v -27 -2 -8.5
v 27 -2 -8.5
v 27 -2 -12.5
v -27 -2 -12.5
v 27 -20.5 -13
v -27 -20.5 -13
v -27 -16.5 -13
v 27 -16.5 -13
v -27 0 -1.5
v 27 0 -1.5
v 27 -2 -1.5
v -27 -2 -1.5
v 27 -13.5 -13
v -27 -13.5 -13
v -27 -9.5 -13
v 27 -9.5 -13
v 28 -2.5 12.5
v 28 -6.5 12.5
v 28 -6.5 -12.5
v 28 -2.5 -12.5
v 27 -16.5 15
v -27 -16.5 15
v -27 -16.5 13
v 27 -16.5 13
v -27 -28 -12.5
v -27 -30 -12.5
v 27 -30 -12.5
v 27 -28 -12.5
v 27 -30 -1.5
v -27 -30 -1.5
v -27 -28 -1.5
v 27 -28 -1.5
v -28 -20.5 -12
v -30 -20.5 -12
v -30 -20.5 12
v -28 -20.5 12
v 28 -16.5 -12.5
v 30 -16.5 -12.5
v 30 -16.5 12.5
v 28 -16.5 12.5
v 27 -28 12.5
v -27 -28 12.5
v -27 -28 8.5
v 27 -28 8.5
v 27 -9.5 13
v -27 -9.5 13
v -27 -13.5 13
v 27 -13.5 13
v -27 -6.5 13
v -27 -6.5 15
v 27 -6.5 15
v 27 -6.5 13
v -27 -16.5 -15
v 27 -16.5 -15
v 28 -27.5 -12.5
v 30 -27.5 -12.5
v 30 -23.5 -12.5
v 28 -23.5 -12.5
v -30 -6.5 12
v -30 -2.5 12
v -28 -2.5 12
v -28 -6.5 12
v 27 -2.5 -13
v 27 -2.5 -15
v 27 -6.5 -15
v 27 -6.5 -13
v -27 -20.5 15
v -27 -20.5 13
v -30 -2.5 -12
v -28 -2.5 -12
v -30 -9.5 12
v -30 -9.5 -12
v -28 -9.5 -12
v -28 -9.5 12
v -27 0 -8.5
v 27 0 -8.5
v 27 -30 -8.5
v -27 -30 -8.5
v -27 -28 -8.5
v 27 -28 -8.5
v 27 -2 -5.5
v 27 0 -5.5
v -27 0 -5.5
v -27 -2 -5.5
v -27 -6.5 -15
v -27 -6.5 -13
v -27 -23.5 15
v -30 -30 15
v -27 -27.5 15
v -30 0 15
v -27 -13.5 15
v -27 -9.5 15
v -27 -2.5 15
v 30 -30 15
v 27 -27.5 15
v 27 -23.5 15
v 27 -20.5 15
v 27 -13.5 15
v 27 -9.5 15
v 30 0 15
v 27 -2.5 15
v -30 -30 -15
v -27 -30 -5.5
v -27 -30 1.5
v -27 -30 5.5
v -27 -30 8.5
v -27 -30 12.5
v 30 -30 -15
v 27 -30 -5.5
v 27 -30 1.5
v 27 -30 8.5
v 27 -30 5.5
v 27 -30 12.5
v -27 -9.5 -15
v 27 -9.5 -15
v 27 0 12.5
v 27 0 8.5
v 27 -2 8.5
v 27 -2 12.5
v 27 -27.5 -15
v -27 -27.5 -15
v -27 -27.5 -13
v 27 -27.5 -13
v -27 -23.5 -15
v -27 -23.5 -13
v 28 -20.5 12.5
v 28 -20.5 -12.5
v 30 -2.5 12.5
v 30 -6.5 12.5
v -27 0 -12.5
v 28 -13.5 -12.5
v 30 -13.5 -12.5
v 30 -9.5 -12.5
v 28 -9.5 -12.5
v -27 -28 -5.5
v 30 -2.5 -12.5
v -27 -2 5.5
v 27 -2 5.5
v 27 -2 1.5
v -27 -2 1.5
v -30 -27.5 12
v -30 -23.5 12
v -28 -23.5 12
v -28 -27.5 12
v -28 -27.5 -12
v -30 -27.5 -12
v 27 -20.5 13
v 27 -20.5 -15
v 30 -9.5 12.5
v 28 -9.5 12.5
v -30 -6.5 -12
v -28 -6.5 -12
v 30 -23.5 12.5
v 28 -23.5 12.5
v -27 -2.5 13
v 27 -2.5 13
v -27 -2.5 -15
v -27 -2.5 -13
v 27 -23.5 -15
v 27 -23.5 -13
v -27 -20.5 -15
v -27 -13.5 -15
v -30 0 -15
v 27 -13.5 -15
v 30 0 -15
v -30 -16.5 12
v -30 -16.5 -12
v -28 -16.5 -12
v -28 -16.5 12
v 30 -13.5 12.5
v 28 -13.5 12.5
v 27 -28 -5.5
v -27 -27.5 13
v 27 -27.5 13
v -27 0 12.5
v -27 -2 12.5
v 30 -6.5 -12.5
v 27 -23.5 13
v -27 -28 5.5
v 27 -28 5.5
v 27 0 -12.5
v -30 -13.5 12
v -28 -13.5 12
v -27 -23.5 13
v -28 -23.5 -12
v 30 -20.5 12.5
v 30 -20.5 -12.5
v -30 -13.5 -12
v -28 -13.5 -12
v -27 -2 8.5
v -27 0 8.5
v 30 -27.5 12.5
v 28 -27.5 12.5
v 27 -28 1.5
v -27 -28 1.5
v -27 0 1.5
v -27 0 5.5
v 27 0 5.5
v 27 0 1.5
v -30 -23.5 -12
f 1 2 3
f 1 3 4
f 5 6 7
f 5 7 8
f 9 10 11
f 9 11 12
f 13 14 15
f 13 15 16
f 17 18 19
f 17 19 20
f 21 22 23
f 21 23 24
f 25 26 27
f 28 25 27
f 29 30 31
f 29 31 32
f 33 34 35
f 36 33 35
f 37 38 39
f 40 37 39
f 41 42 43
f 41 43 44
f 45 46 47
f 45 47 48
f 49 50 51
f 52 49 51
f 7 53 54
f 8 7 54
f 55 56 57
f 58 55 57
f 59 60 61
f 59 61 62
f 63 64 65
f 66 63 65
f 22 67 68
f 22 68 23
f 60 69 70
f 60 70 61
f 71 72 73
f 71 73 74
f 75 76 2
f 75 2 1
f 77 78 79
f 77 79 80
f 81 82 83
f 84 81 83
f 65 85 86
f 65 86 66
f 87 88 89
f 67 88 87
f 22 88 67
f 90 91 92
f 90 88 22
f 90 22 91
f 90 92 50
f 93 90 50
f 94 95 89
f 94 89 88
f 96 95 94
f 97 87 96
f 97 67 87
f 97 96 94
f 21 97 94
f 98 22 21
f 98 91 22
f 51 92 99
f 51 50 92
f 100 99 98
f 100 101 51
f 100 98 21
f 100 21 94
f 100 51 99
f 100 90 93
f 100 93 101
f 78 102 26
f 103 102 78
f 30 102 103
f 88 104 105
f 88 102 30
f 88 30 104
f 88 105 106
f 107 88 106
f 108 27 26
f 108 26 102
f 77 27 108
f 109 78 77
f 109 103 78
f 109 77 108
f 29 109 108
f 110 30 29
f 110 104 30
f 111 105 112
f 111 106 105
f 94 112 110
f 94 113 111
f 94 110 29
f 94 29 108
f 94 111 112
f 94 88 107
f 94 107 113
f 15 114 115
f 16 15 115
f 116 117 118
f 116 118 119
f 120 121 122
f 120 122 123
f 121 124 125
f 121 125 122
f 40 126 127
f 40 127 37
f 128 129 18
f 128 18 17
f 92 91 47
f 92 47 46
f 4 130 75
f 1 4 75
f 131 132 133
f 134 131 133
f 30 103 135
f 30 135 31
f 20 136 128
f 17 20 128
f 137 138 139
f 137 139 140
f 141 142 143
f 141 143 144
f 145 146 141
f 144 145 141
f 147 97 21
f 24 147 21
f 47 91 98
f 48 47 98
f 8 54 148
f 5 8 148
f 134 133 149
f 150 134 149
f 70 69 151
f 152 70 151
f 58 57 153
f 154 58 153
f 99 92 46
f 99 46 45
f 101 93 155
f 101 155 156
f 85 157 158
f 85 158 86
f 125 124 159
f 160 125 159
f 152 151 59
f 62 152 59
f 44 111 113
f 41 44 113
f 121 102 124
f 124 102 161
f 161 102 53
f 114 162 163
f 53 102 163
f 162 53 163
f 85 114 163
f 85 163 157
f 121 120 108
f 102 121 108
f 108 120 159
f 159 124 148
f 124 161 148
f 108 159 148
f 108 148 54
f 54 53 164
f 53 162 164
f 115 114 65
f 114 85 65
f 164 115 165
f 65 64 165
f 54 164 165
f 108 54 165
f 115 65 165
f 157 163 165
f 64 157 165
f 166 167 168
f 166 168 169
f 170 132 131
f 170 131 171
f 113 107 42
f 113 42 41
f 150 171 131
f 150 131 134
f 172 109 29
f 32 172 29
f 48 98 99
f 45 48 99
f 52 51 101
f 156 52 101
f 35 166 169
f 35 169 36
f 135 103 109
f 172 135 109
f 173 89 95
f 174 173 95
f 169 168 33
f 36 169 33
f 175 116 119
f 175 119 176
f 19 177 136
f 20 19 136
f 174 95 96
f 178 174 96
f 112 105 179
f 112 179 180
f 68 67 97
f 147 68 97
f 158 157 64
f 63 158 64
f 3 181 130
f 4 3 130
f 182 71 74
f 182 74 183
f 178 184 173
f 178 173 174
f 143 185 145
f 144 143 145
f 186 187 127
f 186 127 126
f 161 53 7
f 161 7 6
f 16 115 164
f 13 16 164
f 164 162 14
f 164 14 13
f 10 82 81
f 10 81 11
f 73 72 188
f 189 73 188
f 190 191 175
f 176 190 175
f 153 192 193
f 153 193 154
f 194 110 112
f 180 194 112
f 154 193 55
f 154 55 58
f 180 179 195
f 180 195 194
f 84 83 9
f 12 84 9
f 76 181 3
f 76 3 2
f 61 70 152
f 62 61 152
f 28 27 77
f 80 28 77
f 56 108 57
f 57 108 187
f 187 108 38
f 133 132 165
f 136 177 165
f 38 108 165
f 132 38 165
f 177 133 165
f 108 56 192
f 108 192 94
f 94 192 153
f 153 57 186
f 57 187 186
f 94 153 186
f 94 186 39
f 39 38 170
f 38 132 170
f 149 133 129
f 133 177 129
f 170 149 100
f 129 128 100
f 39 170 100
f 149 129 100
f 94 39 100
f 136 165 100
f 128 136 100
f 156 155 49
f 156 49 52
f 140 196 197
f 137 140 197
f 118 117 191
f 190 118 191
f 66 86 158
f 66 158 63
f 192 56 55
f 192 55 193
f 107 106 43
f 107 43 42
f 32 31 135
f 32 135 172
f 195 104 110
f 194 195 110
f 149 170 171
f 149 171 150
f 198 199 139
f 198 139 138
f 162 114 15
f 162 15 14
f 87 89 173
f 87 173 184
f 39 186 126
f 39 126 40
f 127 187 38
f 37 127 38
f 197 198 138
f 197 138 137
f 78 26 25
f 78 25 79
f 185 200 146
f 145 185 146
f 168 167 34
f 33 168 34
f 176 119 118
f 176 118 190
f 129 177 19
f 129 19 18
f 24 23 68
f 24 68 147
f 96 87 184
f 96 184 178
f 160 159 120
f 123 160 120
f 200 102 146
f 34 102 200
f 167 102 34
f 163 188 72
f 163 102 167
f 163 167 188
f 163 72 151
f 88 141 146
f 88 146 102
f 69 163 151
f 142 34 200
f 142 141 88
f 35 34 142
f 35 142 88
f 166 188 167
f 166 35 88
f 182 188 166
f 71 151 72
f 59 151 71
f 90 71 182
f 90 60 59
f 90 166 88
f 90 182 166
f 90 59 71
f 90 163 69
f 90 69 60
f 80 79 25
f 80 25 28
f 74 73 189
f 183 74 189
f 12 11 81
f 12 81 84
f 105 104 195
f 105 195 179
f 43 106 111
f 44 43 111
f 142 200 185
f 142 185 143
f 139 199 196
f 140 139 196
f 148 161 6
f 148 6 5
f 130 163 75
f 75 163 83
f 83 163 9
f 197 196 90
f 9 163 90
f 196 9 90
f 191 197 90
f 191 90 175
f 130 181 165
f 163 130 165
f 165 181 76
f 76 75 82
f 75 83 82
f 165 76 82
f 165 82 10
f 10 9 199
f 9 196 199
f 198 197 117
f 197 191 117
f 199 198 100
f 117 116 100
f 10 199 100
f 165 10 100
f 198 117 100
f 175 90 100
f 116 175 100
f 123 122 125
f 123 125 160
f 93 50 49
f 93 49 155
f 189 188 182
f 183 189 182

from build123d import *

# Parameters (mm, degrees)
F0_W      = 60
F0_H      = 30
F1_DEPTH  = 30
F2_W      = 54
F2_H      = 4
F3_DEPTH  = 2
F4_W      = 54
F4_H      = 4
F5_DEPTH  = 2
F6_W      = 54
F6_H      = 4
F7_DEPTH  = 2
F8_W      = 54
F8_H      = 4
F9_DEPTH  = 2
F10_W     = 4
F10_H     = 24
F11_DEPTH = 2
F12_W     = 4
F12_H     = 25
F13_DEPTH = 2


with BuildPart() as f1:
    # F0 (on Front) → F1 (new body)
    with BuildSketch(Plane.XZ):
        Rectangle(F0_W, F0_H)
    extrude(amount=F1_DEPTH)

    # F2 (on face) → F3 (cut)
    with BuildSketch(Plane.XZ.offset(30)):
        with Locations((0, -10.5)):
            Rectangle(F2_W, F2_H)
        with Locations((0, -3.5)):
            Rectangle(F2_W, F2_H)
        with Locations((0, 3.5)):
            Rectangle(F2_W, F2_H)
        with Locations((0, 10.5)):
            Rectangle(F2_W, F2_H)
    extrude(amount=-F3_DEPTH, mode=Mode.SUBTRACT)

    # F4 (on face) → F5 (cut)
    with BuildSketch(Plane.XY.offset(15)):
        with Locations((0, -4.5)):
            Rectangle(F4_W, F4_H)
        with Locations((0, -11.5)):
            Rectangle(F4_W, F4_H)
        with Locations((0, -18.5)):
            Rectangle(F4_W, F4_H)
        with Locations((0, -25.5)):
            Rectangle(F4_W, F4_H)
    extrude(amount=-F5_DEPTH, mode=Mode.SUBTRACT)

    # F6 (on face) → F7 (cut)
    with BuildSketch(Plane(origin=(0, 0, 0), x_dir=(-1, 0, 0), z_dir=(0, 1, 0))):
        with Locations((0, 10.5)):
            Rectangle(F6_W, F6_H)
        with Locations((0, 3.5)):
            Rectangle(F6_W, F6_H)
        with Locations((0, -3.5)):
            Rectangle(F6_W, F6_H)
        with Locations((0, -10.5)):
            Rectangle(F6_W, F6_H)
    extrude(amount=-F7_DEPTH, mode=Mode.SUBTRACT)

    # F8 (on face) → F9 (cut)
    with BuildSketch(Plane(origin=(0, 0, -15), x_dir=(1, 0, 0), z_dir=(0, 0, -1))):
        with Locations((0, 25.5)):
            Rectangle(F8_W, F8_H)
        with Locations((0, 18.5)):
            Rectangle(F8_W, F8_H)
        with Locations((0, 11.5)):
            Rectangle(F8_W, F8_H)
        with Locations((0, 4.5)):
            Rectangle(F8_W, F8_H)
    extrude(amount=-F9_DEPTH, mode=Mode.SUBTRACT)

    # F10 (on face) → F11 (cut)
    with BuildSketch(Plane(origin=(-30, 0, 0), x_dir=(0, -1, 0), z_dir=(-1, 0, 0))):
        with Locations((4.5, 0)):
            Rectangle(F10_W, F10_H)
        with Locations((11.5, 0)):
            Rectangle(F10_W, F10_H)
        with Locations((18.5, 0)):
            Rectangle(F10_W, F10_H)
        with Locations((25.5, 0)):
            Rectangle(F10_W, F10_H)
    extrude(amount=-F11_DEPTH, mode=Mode.SUBTRACT)

    # F12 (on face) → F13 (cut)
    with BuildSketch(Plane.YZ.offset(30)):
        with Locations((-25.5, 0)):
            Rectangle(F12_W, F12_H)
        with Locations((-18.5, 0)):
            Rectangle(F12_W, F12_H)
        with Locations((-11.5, 0)):
            Rectangle(F12_W, F12_H)
        with Locations((-4.5, 0)):
            Rectangle(F12_W, F12_H)
    extrude(amount=-F13_DEPTH, mode=Mode.SUBTRACT)


solid = f1.part
